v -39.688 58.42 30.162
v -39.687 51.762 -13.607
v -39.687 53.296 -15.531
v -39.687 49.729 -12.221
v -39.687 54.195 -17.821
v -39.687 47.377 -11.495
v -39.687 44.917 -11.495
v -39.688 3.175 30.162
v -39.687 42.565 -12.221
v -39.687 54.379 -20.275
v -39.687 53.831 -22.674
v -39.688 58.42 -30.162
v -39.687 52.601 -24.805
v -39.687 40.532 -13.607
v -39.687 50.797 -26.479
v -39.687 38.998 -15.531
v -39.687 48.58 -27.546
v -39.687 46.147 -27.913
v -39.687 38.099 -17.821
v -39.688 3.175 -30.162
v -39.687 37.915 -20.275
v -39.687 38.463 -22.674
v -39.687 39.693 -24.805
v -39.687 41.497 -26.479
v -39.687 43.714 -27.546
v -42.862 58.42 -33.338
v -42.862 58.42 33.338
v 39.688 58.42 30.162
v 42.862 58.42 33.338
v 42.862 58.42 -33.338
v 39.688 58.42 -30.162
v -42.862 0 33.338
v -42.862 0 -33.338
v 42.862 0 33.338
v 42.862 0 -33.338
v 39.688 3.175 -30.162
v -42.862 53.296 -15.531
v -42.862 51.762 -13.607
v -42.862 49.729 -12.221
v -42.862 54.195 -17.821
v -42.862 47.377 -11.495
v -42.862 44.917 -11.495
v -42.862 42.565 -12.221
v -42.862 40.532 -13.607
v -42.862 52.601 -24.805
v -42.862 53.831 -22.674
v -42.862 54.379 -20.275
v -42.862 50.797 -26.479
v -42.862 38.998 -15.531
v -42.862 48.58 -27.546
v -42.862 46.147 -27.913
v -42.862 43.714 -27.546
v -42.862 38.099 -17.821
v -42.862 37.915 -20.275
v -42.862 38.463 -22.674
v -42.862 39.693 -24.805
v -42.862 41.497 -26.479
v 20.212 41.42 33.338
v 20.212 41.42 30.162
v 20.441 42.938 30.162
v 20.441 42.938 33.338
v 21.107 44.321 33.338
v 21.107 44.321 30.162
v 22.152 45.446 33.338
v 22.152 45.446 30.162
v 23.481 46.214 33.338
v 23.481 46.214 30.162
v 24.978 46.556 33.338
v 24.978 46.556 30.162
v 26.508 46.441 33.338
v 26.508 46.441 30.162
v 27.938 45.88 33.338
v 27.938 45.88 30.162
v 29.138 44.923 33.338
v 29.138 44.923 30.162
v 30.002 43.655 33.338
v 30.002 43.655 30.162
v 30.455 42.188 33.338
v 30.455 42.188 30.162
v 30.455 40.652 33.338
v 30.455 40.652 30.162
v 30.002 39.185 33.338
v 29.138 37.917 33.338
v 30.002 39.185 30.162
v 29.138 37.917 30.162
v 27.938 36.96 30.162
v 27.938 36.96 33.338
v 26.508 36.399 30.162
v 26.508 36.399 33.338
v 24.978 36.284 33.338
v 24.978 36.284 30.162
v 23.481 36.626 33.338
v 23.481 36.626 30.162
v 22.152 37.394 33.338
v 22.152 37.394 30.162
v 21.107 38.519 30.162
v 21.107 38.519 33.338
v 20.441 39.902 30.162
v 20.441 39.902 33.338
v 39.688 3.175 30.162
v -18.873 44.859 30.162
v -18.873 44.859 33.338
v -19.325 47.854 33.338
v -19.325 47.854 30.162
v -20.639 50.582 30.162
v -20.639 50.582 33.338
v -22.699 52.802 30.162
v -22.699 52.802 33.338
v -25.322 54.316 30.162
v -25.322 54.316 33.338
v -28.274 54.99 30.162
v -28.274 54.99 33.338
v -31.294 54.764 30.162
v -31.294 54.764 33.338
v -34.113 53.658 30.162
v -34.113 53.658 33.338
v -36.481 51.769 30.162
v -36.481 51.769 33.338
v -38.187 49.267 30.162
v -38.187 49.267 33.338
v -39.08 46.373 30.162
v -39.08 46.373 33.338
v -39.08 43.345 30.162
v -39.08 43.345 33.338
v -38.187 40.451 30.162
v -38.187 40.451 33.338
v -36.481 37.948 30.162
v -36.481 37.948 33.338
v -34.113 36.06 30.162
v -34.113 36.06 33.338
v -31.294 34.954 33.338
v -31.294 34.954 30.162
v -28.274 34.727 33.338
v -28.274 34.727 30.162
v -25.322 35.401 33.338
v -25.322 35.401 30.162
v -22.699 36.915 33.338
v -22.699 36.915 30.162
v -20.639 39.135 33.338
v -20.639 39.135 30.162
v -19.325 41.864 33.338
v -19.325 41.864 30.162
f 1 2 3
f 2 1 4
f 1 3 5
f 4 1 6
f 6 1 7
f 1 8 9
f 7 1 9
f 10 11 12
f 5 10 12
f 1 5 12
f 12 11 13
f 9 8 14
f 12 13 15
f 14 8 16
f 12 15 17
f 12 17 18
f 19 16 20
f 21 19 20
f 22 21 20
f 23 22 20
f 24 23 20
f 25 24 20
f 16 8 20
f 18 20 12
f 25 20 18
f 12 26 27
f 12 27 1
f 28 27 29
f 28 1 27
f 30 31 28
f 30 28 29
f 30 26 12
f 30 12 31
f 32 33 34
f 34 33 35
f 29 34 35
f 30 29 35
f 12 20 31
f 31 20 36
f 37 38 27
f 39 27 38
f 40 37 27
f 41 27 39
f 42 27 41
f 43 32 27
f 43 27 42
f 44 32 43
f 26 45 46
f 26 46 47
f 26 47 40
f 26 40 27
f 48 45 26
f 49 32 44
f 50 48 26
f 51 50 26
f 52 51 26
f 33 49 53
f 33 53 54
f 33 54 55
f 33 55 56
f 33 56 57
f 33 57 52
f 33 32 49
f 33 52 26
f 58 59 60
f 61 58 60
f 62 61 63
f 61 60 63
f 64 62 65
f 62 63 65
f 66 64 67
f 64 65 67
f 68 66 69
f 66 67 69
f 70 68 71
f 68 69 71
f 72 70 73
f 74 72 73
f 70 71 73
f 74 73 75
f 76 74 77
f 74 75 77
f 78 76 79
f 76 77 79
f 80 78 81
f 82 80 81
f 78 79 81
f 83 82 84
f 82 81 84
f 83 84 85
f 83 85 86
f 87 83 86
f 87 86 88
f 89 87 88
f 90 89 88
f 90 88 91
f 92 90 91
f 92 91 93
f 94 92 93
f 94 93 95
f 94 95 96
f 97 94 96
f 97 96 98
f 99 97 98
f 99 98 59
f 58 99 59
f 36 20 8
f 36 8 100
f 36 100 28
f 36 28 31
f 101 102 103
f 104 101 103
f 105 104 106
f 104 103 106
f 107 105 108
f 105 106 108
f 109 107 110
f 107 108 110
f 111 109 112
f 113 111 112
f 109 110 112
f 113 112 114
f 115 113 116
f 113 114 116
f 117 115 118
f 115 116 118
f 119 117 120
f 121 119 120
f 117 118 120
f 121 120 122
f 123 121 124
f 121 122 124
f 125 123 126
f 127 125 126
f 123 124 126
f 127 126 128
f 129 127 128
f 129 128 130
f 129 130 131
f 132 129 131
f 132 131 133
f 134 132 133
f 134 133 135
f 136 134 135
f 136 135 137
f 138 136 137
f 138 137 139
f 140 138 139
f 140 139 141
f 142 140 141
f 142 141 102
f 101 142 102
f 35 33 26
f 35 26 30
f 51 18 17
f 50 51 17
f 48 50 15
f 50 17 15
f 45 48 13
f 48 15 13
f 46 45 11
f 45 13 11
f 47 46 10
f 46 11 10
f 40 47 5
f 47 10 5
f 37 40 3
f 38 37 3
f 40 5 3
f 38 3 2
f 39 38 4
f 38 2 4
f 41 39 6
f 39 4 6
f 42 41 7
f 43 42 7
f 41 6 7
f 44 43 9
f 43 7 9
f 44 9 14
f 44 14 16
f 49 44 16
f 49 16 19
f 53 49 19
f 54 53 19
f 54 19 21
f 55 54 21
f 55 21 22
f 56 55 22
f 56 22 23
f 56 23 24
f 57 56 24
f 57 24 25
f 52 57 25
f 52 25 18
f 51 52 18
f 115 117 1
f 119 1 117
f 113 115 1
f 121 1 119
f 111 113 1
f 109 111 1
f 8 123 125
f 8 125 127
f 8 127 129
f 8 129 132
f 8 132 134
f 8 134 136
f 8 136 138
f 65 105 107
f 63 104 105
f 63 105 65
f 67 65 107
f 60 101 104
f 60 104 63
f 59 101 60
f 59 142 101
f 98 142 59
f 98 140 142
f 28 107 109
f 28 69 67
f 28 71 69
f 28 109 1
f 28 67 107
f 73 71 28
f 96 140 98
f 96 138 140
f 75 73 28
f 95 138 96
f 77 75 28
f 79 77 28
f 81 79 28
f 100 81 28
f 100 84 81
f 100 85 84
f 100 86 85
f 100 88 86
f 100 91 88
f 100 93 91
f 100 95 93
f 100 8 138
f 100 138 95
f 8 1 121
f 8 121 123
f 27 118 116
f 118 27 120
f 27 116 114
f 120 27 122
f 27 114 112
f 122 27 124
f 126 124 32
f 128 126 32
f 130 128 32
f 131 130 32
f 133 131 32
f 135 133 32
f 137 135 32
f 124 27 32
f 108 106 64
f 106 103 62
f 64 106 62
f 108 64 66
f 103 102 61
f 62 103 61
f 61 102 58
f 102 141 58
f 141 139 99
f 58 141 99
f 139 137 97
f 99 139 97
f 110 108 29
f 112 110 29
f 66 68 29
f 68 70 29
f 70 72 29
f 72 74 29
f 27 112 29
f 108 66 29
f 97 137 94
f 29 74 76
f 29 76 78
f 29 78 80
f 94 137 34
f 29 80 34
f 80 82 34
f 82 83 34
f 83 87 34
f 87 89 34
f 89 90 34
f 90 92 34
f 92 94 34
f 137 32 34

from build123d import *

# Parameters (mm, degrees)
SKETCH1_W           = 85.725
SKETCH1_H           = 66.675
BOSS_EXTRUDE2_DEPTH = 58.42
SHELL1_T            = -3.175
HOLE1_REACH         = 100.466
HOLE1_BORE_R        = 10.16
HOLE2_D             = 16.51
HOLE2_DEPTH         = 3.175
HOLE3_D             = 10.3
HOLE3_DEPTH         = 3.175


with BuildPart() as part:
    # Sketch1 → Boss-Extrude2 (new body)
    with BuildSketch(Plane(origin=(0, 0, 0), x_dir=(1, 0, 0), z_dir=(0, 1, 0))):
        Rectangle(SKETCH1_W, SKETCH1_H)
    extrude(amount=BOSS_EXTRUDE2_DEPTH)

    # Shell1
    shell1_openings = [part.faces().sort_by_distance(p)[0] for p in [
        (0, 58.42, 0),
    ]]
    offset(amount=SHELL1_T, openings=shell1_openings, kind=Kind.INTERSECTION)

    # Hole1 bore → Hole1 (cut, up to next)
    with BuildSketch(Plane.XY.offset(33.3375), mode=Mode.PRIVATE) as hole1_sk1:
        with Locations((-29.033498957, 44.858810897)):
            Circle(HOLE1_BORE_R)
    hole1_tool1 = extrude(hole1_sk1.sketch, amount=-HOLE1_REACH, mode=Mode.PRIVATE) & part.part
    add(hole1_tool1.solids().sort_by_distance((-29.033499, 44.858811, 33.3375))[0], mode=Mode.SUBTRACT)

    # Hole2
    with Locations(Plane.ZY.offset(42.8625)):
        with Locations((-19.658206751, 46.146926064)):
            Hole(HOLE2_D / 2, depth=HOLE2_DEPTH)

    # Hole3
    with Locations(Plane.XY.offset(33.3375)):
        with Locations((25.3625, 41.42)):
            Hole(HOLE3_D / 2, depth=HOLE3_DEPTH)


solid = part.part
